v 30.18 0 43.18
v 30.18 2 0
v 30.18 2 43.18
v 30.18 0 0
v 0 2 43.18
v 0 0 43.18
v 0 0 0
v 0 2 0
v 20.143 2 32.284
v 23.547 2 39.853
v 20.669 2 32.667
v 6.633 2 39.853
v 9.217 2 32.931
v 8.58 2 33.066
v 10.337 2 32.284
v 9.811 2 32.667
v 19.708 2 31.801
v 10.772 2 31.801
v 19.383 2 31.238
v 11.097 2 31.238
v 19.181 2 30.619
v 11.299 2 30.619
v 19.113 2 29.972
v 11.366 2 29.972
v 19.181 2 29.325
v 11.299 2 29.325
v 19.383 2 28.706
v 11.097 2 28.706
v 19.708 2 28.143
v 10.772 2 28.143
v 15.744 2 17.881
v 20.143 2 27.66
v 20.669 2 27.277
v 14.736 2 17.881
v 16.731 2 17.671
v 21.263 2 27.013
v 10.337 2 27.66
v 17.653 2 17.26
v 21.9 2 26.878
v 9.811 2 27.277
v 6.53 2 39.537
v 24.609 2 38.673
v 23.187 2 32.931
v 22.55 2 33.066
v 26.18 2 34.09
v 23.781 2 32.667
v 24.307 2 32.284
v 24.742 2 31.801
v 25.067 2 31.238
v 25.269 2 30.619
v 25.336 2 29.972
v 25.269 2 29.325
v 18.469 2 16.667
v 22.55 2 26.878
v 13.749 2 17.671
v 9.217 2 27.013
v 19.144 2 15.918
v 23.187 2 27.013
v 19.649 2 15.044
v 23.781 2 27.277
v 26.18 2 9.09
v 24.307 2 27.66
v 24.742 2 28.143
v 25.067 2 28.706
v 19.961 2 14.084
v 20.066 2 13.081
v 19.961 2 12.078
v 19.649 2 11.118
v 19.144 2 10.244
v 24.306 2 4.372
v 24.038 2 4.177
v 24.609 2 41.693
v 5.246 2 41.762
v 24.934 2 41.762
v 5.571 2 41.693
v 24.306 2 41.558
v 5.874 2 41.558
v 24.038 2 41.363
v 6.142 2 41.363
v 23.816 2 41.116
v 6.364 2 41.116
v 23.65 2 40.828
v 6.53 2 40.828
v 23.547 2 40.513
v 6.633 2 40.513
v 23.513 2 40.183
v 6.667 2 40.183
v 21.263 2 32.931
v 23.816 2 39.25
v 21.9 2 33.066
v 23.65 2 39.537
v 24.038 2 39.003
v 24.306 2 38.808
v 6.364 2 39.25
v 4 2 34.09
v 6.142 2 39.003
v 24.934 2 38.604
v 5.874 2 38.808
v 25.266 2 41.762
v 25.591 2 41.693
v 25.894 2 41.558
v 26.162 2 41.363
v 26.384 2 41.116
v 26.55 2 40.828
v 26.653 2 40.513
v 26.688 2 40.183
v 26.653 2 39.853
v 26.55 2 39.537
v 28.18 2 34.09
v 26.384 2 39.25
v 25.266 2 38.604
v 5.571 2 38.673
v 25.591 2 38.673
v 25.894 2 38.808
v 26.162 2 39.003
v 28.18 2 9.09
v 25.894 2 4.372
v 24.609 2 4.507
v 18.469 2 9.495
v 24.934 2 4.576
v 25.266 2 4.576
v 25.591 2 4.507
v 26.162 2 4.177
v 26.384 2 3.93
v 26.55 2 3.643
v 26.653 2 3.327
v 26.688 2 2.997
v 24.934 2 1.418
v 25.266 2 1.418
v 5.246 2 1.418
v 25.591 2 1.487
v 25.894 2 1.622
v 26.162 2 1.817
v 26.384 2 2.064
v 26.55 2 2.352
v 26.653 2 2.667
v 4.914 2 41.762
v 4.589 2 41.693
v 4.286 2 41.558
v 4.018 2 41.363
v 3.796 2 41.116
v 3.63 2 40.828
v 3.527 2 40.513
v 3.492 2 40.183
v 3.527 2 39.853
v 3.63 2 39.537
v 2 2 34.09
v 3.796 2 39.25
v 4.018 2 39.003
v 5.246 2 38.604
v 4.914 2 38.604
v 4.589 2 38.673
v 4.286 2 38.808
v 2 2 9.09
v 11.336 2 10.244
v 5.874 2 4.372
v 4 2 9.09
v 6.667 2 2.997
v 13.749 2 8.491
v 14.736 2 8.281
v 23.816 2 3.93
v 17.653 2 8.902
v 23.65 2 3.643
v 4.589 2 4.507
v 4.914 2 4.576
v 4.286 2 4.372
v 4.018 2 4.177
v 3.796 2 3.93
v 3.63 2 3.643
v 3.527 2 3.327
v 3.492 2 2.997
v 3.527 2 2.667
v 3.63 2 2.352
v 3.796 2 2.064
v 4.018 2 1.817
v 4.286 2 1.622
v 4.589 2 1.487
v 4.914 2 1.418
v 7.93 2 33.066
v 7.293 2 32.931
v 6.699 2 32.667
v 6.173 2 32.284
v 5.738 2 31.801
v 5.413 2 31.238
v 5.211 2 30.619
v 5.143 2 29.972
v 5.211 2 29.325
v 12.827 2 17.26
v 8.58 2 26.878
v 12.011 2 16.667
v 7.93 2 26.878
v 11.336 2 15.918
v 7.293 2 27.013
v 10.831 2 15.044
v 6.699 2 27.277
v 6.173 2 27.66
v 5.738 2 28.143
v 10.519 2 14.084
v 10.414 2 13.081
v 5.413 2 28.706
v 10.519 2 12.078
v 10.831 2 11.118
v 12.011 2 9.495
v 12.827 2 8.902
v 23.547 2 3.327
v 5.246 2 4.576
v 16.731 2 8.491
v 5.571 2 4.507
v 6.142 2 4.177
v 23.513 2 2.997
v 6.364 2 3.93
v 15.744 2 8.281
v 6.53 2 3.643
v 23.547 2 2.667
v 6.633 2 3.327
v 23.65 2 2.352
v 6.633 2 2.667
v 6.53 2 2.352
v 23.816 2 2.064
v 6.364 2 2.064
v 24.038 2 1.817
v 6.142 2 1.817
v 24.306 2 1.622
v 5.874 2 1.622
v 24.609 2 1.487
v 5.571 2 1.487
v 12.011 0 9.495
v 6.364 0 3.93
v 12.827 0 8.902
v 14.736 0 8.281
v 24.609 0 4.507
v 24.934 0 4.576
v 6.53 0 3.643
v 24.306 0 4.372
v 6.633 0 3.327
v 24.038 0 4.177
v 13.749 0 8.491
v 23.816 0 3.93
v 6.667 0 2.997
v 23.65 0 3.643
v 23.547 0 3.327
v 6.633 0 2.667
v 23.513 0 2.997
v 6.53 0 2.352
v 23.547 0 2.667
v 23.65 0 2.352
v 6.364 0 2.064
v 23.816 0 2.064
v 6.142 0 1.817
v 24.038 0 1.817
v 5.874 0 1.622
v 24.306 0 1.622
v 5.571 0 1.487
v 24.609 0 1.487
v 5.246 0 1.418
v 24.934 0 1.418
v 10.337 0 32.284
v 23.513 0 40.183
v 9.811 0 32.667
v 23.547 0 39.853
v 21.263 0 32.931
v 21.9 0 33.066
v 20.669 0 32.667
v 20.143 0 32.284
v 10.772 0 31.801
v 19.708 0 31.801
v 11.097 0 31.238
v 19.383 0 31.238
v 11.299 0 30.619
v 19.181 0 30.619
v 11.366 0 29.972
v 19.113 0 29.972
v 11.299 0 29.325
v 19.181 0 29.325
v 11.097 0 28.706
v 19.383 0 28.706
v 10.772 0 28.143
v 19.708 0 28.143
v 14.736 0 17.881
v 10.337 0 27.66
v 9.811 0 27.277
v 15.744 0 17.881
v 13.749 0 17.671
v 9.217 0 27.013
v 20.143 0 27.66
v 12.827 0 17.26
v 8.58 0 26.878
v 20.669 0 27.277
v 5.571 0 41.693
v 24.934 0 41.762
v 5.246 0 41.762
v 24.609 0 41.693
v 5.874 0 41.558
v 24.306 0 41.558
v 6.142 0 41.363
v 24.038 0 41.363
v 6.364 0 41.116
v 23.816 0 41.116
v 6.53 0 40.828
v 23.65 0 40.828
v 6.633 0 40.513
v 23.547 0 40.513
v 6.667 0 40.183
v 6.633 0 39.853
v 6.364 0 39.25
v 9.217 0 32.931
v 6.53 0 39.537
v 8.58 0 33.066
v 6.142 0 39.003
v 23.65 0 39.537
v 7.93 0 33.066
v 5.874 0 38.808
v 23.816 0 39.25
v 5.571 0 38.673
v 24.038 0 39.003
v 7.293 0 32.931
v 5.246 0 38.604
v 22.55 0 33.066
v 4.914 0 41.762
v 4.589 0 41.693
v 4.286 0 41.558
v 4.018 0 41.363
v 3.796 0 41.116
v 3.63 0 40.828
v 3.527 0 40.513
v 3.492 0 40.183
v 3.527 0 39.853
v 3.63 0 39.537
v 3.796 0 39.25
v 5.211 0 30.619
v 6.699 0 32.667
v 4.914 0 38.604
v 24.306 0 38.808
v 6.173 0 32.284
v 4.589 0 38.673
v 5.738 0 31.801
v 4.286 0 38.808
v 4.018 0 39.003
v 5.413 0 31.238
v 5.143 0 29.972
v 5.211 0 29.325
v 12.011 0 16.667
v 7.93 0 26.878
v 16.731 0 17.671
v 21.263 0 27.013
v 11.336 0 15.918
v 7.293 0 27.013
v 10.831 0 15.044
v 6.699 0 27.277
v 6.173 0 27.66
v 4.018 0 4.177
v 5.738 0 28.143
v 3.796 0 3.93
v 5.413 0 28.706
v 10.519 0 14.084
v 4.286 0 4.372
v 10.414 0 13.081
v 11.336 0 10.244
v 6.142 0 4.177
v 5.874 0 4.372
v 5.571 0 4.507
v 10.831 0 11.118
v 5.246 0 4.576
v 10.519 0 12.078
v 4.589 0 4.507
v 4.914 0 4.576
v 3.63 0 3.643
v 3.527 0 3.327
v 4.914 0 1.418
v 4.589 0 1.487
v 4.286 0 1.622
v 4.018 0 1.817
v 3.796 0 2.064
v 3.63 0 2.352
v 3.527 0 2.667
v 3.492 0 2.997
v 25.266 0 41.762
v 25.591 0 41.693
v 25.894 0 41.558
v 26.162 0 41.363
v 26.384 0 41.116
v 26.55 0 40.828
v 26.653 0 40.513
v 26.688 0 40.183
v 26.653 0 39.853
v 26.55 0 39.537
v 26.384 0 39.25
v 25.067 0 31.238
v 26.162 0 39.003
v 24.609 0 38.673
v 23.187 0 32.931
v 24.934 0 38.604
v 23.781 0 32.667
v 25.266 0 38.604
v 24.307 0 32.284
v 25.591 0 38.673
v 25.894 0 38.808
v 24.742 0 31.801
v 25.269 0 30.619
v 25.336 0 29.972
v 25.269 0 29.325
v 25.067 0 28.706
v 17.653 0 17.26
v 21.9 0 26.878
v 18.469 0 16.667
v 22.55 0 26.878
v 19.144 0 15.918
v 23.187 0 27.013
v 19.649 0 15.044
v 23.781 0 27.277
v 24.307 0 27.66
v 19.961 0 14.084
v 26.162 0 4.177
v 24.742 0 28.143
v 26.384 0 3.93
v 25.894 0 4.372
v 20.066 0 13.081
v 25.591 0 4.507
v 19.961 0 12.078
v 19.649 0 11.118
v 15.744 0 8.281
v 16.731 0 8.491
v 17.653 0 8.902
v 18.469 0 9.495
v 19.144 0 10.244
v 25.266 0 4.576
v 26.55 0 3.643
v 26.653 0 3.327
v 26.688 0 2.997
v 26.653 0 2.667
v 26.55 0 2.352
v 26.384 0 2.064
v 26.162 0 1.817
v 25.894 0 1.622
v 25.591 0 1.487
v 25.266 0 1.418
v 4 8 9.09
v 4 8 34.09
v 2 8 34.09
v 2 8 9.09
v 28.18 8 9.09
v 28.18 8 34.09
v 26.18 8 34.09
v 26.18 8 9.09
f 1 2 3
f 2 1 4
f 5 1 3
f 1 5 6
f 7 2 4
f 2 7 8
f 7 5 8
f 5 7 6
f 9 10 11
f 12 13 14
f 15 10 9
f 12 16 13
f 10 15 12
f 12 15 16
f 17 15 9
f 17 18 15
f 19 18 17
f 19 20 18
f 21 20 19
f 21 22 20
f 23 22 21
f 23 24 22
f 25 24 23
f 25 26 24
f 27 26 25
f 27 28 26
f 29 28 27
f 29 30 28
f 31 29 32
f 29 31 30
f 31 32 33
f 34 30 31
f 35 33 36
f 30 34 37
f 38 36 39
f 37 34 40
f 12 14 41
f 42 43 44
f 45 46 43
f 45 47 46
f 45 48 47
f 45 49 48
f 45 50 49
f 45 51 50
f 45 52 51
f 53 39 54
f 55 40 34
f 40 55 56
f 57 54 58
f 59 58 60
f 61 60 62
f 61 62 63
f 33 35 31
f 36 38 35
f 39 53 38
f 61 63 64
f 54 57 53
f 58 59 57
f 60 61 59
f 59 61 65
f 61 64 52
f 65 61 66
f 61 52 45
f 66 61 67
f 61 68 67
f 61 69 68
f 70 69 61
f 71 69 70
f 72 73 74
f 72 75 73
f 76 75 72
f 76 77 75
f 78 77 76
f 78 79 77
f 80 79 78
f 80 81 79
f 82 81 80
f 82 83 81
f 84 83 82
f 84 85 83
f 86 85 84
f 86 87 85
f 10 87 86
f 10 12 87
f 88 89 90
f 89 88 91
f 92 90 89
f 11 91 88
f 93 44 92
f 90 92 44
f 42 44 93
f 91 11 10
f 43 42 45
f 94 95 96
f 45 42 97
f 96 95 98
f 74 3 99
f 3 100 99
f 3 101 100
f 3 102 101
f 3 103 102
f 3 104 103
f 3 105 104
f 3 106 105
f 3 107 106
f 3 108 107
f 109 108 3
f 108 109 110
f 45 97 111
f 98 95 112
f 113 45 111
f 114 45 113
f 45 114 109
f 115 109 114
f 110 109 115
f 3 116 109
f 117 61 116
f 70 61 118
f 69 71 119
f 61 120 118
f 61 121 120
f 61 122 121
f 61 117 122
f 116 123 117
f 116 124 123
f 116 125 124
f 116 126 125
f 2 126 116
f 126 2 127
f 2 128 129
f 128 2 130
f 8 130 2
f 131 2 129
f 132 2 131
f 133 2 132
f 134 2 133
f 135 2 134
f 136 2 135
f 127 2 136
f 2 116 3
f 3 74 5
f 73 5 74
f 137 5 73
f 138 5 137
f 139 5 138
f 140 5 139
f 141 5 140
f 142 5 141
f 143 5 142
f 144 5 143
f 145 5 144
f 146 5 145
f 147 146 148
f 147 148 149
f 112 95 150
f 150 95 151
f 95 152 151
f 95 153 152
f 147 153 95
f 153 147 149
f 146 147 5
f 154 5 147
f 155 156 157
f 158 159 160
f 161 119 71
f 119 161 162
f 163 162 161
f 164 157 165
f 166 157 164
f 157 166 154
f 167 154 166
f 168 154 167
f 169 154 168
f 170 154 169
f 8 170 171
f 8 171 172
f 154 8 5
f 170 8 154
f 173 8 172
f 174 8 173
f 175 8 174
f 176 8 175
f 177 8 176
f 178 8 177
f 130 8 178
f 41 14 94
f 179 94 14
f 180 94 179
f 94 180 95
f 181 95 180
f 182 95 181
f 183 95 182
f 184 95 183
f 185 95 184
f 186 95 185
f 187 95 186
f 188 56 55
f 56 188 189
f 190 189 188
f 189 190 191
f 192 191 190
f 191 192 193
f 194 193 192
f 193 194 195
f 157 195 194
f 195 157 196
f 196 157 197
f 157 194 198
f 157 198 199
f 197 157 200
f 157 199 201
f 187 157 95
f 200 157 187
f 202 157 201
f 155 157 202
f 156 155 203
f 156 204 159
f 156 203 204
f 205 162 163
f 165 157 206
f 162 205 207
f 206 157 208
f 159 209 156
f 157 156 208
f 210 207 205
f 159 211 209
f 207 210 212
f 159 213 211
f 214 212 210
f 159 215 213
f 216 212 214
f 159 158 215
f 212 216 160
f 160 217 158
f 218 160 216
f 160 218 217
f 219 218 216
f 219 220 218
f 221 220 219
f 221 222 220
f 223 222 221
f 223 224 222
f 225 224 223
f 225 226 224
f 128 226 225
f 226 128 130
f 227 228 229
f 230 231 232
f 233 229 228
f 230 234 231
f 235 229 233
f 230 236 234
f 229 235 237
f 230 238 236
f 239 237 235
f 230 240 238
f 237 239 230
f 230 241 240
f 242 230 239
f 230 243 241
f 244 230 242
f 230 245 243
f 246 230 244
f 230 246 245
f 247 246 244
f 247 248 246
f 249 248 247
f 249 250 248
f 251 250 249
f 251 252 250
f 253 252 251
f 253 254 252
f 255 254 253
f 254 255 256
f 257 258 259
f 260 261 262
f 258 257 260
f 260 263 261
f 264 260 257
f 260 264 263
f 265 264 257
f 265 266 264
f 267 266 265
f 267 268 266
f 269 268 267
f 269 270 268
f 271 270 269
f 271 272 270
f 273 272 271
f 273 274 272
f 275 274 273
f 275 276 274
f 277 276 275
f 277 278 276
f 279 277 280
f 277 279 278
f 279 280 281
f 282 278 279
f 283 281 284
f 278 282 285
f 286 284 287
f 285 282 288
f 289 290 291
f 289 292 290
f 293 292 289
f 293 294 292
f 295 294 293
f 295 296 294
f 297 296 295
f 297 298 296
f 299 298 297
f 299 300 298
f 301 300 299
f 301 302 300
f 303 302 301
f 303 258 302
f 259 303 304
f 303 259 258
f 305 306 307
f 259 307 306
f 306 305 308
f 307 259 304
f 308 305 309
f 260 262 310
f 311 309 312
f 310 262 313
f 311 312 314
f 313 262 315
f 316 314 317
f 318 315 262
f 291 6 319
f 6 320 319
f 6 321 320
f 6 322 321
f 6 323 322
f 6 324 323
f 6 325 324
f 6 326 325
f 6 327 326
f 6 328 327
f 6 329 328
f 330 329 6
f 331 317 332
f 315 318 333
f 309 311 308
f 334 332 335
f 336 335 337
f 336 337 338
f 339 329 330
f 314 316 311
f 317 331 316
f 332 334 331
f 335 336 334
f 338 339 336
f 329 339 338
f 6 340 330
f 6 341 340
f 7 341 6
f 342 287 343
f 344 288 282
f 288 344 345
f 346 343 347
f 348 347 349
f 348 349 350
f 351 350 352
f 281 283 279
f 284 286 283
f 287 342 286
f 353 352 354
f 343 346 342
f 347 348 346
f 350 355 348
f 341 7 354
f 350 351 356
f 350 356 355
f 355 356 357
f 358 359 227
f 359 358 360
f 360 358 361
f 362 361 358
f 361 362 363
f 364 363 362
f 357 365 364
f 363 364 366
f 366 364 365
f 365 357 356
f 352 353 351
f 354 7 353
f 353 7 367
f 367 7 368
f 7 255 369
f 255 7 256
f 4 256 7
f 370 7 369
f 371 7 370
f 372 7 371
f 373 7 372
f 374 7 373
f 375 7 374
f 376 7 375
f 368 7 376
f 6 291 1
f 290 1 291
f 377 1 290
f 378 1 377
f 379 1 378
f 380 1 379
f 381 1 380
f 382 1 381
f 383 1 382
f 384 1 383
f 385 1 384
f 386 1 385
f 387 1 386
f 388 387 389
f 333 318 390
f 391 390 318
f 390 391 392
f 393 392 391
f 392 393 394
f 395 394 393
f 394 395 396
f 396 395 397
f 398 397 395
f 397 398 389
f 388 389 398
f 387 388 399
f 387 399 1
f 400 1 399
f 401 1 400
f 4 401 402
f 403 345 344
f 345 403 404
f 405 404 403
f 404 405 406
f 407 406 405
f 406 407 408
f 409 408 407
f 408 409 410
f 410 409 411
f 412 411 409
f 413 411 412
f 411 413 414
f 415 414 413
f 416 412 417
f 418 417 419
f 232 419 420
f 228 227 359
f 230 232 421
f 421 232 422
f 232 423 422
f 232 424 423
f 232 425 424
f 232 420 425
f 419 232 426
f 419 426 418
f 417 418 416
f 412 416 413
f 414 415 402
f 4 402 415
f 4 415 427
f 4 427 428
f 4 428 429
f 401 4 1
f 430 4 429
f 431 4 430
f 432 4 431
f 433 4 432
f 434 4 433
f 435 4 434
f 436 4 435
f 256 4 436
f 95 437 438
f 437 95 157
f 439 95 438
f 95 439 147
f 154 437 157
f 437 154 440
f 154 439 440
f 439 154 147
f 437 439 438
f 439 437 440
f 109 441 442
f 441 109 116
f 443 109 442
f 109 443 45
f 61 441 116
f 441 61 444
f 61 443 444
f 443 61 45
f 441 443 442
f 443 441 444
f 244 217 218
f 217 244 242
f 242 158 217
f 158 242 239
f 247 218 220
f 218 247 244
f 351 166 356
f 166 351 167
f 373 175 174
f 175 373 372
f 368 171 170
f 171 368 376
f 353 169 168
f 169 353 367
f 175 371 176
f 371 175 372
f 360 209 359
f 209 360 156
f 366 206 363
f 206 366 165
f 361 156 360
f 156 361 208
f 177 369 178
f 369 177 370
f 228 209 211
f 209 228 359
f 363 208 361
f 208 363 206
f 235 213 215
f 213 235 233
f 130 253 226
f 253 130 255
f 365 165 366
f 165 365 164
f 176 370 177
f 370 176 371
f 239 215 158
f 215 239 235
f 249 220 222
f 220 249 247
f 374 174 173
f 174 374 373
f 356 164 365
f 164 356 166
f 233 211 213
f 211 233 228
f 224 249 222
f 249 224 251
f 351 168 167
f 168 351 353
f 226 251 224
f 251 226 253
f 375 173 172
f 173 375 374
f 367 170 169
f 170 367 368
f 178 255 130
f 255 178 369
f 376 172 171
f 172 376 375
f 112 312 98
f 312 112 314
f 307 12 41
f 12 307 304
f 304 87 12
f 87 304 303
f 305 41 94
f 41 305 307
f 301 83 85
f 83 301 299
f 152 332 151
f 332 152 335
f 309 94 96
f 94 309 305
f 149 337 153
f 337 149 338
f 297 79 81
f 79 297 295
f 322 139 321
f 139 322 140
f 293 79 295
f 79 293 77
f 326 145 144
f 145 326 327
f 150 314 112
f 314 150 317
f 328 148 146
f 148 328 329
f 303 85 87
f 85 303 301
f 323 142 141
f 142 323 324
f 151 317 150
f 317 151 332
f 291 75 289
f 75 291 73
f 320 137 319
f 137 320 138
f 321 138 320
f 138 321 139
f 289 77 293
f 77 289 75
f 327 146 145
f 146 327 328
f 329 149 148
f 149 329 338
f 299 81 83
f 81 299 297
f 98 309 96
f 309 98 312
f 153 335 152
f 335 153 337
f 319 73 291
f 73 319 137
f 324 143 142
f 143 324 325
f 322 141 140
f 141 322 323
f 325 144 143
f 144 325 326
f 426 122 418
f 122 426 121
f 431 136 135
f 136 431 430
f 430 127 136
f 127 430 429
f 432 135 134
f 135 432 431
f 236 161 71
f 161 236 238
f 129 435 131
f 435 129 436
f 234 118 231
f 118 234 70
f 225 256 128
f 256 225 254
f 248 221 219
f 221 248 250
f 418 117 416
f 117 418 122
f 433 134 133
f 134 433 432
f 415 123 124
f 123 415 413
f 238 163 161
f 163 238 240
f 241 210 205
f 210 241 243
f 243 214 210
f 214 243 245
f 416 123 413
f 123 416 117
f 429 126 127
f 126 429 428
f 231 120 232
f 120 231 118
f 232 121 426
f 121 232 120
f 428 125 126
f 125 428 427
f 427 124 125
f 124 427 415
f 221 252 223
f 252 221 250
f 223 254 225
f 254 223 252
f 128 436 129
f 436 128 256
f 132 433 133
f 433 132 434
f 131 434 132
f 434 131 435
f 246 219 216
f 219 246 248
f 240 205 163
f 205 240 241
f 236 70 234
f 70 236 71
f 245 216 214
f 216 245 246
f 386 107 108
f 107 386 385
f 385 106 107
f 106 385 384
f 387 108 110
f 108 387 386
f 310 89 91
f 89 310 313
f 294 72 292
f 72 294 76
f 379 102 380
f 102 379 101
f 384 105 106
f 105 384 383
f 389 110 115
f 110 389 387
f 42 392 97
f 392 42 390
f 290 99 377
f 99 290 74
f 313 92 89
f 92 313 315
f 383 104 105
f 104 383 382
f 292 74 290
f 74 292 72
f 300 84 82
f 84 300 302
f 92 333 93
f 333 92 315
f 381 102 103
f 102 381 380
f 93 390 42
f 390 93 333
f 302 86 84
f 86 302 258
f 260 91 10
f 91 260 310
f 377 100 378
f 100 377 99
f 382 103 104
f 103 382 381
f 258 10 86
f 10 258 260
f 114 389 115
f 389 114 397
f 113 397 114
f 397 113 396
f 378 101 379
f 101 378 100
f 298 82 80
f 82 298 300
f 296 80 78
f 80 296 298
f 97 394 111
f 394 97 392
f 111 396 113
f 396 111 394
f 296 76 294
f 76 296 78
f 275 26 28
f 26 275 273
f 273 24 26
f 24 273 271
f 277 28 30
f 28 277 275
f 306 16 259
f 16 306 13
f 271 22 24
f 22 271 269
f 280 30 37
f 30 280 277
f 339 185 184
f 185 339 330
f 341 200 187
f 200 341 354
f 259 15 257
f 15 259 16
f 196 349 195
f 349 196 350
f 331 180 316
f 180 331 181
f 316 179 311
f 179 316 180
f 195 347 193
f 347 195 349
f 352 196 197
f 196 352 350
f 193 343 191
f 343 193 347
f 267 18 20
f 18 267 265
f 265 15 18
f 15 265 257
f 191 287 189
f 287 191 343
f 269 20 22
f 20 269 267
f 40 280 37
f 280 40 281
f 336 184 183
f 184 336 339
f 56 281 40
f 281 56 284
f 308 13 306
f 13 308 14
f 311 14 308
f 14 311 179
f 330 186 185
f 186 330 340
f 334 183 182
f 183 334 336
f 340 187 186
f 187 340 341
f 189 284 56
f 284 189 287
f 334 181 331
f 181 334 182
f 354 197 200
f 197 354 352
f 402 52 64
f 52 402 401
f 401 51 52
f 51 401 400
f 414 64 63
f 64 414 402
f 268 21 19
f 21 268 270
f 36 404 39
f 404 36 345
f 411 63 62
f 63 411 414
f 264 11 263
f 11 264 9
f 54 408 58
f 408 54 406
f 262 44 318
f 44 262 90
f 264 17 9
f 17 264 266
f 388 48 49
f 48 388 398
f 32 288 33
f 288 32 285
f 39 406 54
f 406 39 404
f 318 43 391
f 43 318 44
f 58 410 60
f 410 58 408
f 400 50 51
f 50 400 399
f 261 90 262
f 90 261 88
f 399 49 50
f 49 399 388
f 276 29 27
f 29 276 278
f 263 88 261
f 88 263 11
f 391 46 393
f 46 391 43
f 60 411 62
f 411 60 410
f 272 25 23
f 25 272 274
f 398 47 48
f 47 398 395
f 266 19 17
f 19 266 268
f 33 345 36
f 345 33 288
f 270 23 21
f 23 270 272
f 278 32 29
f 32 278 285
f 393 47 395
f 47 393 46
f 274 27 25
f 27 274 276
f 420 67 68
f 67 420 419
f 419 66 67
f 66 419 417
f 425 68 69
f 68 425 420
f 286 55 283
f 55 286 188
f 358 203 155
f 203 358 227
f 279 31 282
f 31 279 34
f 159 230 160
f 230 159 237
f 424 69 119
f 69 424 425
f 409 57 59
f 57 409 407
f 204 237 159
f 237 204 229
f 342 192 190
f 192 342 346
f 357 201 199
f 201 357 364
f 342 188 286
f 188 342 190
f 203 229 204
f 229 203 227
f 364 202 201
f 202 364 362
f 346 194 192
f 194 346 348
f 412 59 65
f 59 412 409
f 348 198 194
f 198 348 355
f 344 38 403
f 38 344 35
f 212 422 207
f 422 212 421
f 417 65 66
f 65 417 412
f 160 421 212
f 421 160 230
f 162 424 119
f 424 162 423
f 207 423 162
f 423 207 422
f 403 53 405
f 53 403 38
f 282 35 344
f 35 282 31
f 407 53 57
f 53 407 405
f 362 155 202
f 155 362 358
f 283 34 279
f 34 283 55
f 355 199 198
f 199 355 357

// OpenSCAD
// file: blank_tile.scad
hp = 6; // width in hole points
plate_height = 1.7 * 25.4; // spec is 1.7"
plate_width = hp * 5.08 - 0.3; // general conversion factor with fudge for tolerance

module front_face() {
    thickness = 2; // thickness of PCB front panels
    cube([plate_width, thickness, plate_height], center=false);
}

rib_width = 2;
rib_inset = 2;
rib_height = 25; // max physically measured at 29.06
rib_depth = 8;
module left_stiffening_rib() {
    translate([rib_inset, 0, ((plate_height - rib_height) / 2)]){
        cube([rib_width, rib_depth, rib_height], center=false);
    }
}

module right_stiffening_rib() {
    translate([((plate_width - rib_width) - rib_inset), 0, ((plate_height - rib_height) / 2)]){
        cube([rib_width, rib_depth, rib_height], center=false);
    }
}

module material() {
    union() {
        front_face();
        left_stiffening_rib();
        right_stiffening_rib();
    }
}

module mounting_holes() {
    // make round shapes more fine
    $fs = 0.1;

    mounting_hole_dia = 0.125 * 25.4; // spec 0.125"
    hole_horiz_offset = 0.2 * 25.4; // spec 0.200"
    hole_vert_offset = 0.118 * 25.4; // spec 0.118"

    module hole_pair(h_offset) {
        translate([h_offset, 0, hole_vert_offset])
            rotate([270,0,0])
                cylinder(r=mounting_hole_dia / 2, h=10, center=true);
        
        translate([h_offset, 0, plate_height - hole_vert_offset])
            rotate([270,0,0])
                cylinder(r=mounting_hole_dia / 2, h=10, center=true);
    }
    hole_pair(hole_horiz_offset);
    hole_pair(plate_width - hole_horiz_offset);
}

module cutouts() {
    mounting_holes();
}
module blank_tile() {
    difference() {
        material();
        cutouts();
    }
}

blank_tile();
// main file
/*
A Pulp Logic compatible 1U with cutouts to mount two jacks and one potentiometer.

based on the "2 Jacks and a Pot" example given here
http://pulplogic.com/1u_tiles/

units: millimeters
*/

use <blank_tile.scad>

function inches( x) = x * 25.4; // convert inches to mm

module cutouts() {
    $fs=0.01; // make cylinder curves more fine

    // top-left jack
    translate([inches(0.325), 0, inches(1.180)])
        rotate([270,0,0])
            cylinder(r=inches(0.245 / 2), h=10, center=true);

    // top-right jack
    translate([inches(0.875),0, inches(1.180)])
        rotate([270,0,0])
            cylinder(r=inches(0.245 / 2), h=10, center=true);
    
    // lower center potentiometer
    translate([inches(0.600), 0, inches(0.515)])
        rotate([270, 0, 0])
            cylinder(r=inches(0.380 / 2), h=10, center=true);
}

module one_pot_two_jacks() {
    difference() {
        blank_tile();
        cutouts();
    }
}

one_pot_two_jacks();
